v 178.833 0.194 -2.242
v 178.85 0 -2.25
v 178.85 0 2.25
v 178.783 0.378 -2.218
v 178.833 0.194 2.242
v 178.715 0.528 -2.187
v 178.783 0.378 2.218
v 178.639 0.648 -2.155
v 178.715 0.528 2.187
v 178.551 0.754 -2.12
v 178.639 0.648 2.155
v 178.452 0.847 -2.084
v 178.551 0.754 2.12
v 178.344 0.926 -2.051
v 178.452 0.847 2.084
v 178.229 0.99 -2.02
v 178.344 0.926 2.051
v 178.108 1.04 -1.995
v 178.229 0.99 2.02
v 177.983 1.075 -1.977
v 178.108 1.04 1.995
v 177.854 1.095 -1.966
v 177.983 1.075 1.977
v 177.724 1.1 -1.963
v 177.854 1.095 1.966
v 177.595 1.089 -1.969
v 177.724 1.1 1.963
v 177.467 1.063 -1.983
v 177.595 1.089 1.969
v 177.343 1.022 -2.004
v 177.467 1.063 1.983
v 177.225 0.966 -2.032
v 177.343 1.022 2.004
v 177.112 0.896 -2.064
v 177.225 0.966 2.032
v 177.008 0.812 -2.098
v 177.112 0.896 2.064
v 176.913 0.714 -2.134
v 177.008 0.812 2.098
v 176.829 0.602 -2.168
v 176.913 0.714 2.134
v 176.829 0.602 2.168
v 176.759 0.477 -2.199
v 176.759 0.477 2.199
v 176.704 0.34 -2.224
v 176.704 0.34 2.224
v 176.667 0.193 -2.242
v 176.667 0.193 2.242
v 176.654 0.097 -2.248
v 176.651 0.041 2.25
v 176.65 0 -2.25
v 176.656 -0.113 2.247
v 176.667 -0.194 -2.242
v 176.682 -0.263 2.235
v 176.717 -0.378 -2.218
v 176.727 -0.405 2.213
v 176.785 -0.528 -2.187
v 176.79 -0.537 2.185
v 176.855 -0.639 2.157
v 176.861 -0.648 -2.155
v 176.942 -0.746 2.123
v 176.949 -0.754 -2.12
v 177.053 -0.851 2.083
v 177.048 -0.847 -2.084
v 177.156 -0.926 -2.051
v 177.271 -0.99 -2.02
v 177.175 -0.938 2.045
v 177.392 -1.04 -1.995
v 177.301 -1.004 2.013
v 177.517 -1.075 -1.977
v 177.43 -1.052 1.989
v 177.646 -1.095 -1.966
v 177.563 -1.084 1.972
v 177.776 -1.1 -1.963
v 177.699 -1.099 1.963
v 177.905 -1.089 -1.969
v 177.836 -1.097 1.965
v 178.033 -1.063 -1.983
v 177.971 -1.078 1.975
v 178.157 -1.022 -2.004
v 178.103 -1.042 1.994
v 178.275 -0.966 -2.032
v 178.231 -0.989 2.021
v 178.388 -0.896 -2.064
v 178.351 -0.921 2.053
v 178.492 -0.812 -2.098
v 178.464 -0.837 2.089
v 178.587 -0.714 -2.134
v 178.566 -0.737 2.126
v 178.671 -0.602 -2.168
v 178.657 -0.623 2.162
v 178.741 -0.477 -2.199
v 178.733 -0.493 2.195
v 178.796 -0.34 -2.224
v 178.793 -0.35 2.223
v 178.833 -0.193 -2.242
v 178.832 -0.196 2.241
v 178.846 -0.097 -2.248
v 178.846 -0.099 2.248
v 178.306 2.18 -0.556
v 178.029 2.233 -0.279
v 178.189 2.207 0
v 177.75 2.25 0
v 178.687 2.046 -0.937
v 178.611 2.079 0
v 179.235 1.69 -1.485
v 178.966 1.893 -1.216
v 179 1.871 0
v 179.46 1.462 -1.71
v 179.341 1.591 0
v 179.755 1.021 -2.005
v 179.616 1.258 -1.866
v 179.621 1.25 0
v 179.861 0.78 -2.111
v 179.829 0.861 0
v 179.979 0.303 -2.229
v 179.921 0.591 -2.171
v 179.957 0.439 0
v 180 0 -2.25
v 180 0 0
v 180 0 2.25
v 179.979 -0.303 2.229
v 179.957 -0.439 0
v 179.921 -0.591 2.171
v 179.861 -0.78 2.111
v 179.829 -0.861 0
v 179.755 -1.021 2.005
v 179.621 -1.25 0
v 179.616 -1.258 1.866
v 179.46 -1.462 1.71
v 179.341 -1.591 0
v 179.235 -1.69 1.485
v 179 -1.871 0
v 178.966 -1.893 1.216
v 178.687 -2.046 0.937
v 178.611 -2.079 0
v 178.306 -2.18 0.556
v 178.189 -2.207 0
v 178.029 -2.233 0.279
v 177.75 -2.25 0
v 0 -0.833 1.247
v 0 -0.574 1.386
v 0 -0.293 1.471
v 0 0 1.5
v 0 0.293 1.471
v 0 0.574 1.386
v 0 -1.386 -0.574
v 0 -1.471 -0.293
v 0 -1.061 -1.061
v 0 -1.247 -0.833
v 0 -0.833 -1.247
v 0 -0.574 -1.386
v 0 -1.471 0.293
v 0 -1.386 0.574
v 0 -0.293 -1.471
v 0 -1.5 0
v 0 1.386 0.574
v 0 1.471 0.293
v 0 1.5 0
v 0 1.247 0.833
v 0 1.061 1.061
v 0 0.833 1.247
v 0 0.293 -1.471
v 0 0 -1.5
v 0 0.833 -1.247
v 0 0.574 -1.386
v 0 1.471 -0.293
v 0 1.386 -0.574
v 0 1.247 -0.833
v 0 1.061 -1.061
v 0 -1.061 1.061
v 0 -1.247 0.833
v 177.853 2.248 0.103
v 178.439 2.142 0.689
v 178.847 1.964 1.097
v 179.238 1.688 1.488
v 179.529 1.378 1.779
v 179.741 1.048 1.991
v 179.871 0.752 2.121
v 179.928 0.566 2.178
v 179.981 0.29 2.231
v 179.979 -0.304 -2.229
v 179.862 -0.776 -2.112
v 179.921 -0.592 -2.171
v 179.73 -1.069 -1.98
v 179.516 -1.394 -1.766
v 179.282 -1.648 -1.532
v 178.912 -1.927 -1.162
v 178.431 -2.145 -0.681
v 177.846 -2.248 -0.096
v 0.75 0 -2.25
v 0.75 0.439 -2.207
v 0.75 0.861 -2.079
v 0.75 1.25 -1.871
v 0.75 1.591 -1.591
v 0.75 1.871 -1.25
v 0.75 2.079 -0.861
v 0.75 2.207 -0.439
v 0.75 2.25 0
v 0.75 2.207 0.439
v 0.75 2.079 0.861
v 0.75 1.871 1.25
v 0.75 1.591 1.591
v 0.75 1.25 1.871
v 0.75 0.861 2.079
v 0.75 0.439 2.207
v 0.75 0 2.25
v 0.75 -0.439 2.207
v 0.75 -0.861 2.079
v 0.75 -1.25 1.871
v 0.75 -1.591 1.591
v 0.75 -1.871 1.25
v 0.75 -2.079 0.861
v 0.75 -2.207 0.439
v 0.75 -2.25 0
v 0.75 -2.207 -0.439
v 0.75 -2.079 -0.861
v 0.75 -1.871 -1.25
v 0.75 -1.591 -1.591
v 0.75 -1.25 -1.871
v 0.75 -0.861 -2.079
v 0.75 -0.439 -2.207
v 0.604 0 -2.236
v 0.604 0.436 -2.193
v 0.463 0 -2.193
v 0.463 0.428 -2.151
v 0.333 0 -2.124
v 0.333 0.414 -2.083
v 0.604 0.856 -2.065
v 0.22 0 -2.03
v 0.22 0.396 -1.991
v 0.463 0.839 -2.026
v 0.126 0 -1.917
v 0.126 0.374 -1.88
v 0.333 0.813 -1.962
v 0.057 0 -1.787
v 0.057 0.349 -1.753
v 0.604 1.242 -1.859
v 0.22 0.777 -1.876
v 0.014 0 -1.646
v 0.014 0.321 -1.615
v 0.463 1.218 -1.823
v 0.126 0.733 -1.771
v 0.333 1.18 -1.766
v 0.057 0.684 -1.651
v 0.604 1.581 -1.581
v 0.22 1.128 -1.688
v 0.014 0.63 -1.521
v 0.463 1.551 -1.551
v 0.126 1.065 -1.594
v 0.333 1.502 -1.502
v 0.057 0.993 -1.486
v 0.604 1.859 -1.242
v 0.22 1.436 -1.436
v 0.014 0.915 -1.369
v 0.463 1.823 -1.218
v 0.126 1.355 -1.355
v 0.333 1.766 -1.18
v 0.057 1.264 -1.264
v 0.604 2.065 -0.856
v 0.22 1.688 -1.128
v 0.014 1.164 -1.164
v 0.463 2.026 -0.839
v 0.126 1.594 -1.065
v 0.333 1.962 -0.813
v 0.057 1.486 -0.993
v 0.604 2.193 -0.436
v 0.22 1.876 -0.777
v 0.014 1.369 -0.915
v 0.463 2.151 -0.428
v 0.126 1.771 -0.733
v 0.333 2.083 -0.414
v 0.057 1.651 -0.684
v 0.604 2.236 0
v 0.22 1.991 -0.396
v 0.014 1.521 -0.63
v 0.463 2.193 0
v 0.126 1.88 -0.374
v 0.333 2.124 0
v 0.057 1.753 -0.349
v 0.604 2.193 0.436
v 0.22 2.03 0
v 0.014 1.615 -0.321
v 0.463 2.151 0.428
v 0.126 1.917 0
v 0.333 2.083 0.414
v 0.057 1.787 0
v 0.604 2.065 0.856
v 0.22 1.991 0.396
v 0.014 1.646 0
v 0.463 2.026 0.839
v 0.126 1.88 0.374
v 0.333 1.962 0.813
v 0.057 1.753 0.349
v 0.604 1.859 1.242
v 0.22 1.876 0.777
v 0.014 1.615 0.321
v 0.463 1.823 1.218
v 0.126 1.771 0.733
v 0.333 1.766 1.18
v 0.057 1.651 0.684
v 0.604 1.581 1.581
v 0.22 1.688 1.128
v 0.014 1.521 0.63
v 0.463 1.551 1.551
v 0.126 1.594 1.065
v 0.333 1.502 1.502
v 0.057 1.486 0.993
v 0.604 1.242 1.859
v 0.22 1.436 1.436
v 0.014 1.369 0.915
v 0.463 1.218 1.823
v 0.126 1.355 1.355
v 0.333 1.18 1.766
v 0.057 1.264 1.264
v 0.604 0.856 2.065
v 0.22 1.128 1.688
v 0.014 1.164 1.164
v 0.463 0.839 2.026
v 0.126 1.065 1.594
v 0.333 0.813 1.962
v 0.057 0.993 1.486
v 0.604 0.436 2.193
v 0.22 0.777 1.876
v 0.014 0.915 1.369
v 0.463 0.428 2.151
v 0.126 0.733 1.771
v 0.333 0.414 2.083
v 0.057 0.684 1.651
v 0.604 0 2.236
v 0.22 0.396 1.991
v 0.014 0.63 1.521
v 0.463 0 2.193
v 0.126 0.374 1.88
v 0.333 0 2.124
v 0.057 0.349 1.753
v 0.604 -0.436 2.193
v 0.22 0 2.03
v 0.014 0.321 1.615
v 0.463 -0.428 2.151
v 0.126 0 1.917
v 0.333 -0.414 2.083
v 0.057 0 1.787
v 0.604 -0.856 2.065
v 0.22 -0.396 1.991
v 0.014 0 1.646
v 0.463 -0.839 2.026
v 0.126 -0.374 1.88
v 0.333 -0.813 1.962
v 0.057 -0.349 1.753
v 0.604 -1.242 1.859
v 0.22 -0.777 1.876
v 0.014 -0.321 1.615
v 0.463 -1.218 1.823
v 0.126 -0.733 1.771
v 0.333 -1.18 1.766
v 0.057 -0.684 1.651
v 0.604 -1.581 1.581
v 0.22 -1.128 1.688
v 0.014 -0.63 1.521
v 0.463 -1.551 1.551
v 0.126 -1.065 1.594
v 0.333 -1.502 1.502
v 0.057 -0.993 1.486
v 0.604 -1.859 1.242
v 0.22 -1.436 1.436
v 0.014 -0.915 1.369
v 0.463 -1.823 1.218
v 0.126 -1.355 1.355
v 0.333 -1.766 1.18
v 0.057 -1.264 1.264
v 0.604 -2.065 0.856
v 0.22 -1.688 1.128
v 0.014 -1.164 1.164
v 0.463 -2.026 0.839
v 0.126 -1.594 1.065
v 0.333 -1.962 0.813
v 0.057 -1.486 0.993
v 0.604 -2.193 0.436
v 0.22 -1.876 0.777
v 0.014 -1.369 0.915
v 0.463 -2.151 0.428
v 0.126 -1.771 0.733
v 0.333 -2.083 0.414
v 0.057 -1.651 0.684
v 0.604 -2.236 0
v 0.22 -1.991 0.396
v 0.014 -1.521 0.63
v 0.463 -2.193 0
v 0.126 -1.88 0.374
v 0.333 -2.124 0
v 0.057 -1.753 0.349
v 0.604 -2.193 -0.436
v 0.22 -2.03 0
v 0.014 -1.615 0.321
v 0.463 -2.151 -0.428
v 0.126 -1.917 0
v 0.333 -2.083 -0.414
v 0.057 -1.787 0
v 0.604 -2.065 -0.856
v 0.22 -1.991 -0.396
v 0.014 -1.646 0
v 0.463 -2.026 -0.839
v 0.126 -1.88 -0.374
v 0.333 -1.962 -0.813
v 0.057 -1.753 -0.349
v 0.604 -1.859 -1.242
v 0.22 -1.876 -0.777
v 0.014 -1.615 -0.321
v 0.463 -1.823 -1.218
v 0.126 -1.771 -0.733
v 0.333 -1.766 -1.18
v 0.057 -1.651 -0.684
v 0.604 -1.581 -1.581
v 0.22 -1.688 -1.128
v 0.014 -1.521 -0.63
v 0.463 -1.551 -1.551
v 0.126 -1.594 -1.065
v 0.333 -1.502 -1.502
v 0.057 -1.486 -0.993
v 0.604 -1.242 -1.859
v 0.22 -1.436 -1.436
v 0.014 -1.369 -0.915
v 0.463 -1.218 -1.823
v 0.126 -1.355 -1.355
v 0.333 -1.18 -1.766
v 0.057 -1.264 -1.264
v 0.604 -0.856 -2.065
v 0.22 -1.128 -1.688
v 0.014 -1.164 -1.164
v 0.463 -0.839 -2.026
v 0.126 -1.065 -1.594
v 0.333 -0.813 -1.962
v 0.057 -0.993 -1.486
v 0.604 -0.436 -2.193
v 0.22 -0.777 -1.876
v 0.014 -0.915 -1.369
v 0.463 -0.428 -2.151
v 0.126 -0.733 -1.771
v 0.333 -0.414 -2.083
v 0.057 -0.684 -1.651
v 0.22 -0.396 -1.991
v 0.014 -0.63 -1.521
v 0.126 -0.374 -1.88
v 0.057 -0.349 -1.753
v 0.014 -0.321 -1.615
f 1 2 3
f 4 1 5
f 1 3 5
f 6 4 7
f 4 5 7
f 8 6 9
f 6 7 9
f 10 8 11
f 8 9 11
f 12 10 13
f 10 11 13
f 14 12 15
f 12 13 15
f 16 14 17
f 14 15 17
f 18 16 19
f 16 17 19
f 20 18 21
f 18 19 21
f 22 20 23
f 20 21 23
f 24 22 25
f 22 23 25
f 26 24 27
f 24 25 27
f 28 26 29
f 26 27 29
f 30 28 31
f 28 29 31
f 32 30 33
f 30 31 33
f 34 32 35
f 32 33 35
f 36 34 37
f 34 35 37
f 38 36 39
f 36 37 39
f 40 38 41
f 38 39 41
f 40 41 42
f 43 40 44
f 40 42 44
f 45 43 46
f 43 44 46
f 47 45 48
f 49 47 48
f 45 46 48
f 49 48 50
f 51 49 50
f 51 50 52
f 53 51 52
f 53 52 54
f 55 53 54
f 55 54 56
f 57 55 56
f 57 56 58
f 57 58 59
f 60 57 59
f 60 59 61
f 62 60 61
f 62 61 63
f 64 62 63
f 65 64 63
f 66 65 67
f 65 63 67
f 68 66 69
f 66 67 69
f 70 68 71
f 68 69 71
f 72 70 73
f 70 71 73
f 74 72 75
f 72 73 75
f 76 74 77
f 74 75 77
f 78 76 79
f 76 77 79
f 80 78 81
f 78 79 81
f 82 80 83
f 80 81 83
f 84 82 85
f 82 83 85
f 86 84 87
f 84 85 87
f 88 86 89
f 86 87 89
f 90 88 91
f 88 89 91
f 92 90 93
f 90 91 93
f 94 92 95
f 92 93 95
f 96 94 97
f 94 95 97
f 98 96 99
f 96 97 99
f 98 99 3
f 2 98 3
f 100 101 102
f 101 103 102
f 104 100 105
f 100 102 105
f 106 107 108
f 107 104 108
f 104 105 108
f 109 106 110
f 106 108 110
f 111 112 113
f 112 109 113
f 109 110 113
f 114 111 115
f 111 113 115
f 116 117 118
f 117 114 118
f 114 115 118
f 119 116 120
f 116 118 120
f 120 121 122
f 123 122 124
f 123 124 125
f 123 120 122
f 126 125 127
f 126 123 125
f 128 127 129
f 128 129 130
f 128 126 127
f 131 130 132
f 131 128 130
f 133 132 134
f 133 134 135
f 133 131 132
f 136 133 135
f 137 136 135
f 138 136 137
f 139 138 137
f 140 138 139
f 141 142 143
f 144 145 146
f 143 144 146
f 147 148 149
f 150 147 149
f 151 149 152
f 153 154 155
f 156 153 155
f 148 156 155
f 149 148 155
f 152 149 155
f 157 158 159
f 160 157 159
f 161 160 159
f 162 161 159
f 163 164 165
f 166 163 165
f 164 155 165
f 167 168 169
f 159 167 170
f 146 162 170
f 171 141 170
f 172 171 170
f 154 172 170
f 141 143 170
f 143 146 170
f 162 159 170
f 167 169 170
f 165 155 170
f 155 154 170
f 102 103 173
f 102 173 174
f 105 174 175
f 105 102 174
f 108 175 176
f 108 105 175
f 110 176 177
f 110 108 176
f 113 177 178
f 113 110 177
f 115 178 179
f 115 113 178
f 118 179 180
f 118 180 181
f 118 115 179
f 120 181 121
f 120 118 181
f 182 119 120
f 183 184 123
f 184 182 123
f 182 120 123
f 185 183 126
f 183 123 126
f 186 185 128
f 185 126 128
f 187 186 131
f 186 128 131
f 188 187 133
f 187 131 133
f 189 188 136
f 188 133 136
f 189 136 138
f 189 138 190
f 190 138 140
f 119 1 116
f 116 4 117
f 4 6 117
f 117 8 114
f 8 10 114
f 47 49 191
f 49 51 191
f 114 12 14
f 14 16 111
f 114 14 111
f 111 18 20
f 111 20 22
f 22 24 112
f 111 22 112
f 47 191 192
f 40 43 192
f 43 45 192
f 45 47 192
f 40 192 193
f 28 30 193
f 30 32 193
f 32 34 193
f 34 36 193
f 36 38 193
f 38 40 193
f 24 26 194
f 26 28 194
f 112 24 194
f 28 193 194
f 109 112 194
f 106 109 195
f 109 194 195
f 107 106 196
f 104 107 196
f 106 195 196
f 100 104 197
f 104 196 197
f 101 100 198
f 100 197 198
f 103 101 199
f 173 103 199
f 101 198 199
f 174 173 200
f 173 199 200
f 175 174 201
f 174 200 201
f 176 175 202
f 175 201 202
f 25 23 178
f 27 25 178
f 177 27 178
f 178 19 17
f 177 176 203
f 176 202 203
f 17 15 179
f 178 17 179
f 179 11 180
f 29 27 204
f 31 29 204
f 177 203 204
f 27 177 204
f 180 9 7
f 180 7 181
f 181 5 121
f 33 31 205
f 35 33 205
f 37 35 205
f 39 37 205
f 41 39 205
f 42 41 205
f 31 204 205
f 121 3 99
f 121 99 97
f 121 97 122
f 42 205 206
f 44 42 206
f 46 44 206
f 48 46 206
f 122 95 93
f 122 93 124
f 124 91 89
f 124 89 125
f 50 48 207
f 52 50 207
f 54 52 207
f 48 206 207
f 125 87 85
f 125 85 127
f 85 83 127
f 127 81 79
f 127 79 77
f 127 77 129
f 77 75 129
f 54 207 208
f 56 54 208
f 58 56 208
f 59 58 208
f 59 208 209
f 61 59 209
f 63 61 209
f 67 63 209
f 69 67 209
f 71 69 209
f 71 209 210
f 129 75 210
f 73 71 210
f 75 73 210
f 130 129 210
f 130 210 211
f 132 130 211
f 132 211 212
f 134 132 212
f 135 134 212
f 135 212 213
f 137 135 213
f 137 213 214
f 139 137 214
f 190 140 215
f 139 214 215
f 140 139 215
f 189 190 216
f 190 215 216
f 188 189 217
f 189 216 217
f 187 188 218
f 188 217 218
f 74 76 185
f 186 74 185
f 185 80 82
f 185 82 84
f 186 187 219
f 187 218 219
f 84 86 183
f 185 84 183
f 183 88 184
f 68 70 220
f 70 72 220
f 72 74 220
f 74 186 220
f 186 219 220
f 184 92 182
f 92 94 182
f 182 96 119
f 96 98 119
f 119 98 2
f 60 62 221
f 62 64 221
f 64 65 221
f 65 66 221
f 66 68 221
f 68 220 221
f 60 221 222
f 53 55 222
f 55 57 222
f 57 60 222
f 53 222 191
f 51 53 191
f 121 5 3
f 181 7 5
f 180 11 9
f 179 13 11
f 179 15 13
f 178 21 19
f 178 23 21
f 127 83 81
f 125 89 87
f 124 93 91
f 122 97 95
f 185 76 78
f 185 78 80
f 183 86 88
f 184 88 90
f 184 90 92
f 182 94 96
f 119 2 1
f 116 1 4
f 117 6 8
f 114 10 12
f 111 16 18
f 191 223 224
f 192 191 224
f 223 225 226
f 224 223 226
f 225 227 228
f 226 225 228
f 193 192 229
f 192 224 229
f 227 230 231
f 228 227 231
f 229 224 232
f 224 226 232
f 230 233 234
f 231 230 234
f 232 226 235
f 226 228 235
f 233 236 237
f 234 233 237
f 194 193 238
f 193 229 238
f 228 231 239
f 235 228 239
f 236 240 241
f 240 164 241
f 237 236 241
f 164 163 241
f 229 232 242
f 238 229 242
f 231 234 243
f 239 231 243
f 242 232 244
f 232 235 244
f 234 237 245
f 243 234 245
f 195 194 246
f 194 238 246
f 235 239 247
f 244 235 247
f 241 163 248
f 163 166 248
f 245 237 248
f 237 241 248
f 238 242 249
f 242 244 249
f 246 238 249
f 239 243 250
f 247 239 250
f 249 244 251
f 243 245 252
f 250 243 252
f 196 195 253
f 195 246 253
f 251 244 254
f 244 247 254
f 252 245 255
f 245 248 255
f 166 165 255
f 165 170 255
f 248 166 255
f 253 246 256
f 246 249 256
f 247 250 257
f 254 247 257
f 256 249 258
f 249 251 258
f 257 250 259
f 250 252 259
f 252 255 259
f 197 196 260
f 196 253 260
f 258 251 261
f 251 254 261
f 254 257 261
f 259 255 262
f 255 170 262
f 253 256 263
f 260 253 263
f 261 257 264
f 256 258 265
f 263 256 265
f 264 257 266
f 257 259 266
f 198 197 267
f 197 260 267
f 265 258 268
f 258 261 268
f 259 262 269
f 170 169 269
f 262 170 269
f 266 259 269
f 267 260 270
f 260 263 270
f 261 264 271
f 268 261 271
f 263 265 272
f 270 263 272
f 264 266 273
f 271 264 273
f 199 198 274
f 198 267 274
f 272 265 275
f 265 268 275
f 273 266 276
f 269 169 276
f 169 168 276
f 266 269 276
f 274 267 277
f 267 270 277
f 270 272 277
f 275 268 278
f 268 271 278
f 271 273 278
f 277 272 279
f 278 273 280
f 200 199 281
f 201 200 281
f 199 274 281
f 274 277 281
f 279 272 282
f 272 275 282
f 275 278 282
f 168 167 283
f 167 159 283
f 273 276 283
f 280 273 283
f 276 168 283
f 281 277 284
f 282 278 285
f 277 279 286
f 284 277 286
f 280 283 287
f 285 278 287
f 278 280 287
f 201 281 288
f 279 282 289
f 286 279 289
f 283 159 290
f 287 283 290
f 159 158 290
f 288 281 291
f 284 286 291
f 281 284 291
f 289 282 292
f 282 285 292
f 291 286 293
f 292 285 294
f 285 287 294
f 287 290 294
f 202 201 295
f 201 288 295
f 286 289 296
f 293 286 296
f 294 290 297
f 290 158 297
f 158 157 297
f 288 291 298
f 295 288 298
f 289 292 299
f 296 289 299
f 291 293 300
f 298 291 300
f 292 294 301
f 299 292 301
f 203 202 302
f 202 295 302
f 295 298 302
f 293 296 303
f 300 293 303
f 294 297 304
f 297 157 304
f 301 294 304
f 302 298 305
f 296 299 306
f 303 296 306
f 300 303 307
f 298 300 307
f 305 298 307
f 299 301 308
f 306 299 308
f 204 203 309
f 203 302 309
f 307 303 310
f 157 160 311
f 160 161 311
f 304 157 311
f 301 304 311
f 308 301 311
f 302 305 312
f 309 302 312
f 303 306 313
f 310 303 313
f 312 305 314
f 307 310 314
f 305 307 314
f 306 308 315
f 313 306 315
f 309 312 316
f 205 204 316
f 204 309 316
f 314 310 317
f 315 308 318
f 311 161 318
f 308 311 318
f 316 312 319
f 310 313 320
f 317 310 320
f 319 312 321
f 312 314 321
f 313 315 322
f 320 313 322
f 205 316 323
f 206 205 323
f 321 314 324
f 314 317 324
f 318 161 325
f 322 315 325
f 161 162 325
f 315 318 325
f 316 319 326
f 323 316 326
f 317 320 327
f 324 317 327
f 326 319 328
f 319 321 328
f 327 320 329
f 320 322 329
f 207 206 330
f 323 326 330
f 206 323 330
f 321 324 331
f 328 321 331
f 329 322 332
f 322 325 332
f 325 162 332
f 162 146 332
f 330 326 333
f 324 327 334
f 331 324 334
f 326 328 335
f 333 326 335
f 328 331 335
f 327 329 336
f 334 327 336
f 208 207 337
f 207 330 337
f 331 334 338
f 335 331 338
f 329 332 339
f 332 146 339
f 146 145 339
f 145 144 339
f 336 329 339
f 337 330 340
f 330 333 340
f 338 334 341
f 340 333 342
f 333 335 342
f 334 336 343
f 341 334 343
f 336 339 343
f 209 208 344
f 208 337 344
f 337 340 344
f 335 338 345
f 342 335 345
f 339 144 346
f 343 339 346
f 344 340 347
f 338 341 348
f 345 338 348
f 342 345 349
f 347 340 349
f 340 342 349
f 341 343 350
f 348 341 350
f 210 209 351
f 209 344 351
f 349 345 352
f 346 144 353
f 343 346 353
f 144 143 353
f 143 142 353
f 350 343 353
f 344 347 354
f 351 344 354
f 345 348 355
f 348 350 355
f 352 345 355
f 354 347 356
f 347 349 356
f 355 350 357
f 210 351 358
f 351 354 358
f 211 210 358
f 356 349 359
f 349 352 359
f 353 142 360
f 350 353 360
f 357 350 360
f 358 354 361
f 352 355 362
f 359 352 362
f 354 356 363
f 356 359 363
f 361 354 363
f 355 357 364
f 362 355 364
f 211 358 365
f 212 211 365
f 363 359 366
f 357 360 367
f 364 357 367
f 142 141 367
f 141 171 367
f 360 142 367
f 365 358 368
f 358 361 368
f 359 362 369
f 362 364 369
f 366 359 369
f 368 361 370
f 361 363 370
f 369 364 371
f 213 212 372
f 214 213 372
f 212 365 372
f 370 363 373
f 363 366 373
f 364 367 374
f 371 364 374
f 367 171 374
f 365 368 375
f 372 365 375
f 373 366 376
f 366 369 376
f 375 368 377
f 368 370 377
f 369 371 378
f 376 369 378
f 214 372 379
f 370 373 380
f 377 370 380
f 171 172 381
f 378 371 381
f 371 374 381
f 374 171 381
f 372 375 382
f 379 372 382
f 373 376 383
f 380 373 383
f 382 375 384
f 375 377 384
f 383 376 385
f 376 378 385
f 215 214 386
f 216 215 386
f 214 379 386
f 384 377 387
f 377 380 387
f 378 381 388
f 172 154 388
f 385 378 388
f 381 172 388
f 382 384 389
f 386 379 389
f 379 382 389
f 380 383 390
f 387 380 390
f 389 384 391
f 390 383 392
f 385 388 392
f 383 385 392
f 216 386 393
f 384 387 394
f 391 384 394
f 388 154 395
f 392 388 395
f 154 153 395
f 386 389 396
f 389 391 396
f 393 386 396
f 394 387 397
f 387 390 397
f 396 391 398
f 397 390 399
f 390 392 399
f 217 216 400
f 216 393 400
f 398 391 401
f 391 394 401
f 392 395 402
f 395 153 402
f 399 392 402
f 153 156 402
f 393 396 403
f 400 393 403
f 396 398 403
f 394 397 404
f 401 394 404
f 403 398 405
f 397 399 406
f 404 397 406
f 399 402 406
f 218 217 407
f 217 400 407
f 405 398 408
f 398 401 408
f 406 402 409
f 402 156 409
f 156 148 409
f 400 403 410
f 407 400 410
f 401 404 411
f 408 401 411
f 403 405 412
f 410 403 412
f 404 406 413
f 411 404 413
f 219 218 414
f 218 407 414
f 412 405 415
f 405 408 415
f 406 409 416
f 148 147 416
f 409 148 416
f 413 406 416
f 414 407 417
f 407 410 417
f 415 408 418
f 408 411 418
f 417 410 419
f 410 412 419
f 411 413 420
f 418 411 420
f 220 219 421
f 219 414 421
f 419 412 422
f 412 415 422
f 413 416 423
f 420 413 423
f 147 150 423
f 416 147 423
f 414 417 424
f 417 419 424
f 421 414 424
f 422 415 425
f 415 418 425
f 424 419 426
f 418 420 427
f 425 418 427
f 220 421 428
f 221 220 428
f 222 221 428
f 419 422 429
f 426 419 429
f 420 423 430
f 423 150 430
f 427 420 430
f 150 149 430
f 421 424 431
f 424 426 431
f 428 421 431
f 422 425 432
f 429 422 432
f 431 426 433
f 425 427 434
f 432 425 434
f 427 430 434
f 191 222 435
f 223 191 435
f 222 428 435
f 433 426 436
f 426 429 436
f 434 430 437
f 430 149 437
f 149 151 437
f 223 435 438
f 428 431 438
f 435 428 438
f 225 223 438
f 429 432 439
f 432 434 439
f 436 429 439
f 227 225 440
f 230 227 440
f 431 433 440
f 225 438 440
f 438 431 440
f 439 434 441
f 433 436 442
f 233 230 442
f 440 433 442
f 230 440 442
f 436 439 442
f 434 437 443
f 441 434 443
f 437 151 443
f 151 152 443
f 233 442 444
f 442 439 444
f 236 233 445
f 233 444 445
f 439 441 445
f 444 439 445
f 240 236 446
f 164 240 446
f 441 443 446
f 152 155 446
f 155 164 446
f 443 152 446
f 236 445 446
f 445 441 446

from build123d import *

# Parameters (mm, degrees)
SKETCH1_R               = 2.25
BOSS_EXTRUDE1_DEPTH     = 180
FILLET1_R               = 0.75
SKETCH2_R               = 1.1
CUT_EXTRUDE1_DEPTH      = 3.25
CUT_EXTRUDE1_DEPTH_BACK = 3.25


with BuildPart() as part:
    # Sketch1 → Boss-Extrude1 (new body)
    with BuildSketch(Plane(origin=(0, 0, 0), x_dir=(0, 0, -1), z_dir=(1, 0, 0))):
        Circle(SKETCH1_R)
    extrude(amount=BOSS_EXTRUDE1_DEPTH)

    # Fillet1
    fillet1_edges = [part.edges().sort_by_distance(p)[0] for p in [
        (0, 0, 2.25),
    ]]
    fillet(fillet1_edges, radius=FILLET1_R)

    # Sketch2 → Cut-Extrude1 (cut, two sides)
    with BuildSketch(Plane.XY) as cut_extrude1_sk:
        with BuildLine():
            Line((180, 2.25), (177.75, 2.25))
            ThreePointArc((177.75, 2.25), (179.340990258, 1.590990258), (180, 0))
            Line((180, 0), (180, 2.25))
        make_face()
        with BuildLine():
            Line((180, -2.25), (180, 0))
            ThreePointArc((180, 0), (179.340990258, -1.590990258), (177.75, -2.25))
            Line((177.75, -2.25), (180, -2.25))
        make_face()
        with Locations((177.75, 0)):
            Circle(SKETCH2_R)
    extrude(amount=CUT_EXTRUDE1_DEPTH, mode=Mode.SUBTRACT)
    extrude(cut_extrude1_sk.sketch, amount=-CUT_EXTRUDE1_DEPTH_BACK, mode=Mode.SUBTRACT)


solid = part.part
